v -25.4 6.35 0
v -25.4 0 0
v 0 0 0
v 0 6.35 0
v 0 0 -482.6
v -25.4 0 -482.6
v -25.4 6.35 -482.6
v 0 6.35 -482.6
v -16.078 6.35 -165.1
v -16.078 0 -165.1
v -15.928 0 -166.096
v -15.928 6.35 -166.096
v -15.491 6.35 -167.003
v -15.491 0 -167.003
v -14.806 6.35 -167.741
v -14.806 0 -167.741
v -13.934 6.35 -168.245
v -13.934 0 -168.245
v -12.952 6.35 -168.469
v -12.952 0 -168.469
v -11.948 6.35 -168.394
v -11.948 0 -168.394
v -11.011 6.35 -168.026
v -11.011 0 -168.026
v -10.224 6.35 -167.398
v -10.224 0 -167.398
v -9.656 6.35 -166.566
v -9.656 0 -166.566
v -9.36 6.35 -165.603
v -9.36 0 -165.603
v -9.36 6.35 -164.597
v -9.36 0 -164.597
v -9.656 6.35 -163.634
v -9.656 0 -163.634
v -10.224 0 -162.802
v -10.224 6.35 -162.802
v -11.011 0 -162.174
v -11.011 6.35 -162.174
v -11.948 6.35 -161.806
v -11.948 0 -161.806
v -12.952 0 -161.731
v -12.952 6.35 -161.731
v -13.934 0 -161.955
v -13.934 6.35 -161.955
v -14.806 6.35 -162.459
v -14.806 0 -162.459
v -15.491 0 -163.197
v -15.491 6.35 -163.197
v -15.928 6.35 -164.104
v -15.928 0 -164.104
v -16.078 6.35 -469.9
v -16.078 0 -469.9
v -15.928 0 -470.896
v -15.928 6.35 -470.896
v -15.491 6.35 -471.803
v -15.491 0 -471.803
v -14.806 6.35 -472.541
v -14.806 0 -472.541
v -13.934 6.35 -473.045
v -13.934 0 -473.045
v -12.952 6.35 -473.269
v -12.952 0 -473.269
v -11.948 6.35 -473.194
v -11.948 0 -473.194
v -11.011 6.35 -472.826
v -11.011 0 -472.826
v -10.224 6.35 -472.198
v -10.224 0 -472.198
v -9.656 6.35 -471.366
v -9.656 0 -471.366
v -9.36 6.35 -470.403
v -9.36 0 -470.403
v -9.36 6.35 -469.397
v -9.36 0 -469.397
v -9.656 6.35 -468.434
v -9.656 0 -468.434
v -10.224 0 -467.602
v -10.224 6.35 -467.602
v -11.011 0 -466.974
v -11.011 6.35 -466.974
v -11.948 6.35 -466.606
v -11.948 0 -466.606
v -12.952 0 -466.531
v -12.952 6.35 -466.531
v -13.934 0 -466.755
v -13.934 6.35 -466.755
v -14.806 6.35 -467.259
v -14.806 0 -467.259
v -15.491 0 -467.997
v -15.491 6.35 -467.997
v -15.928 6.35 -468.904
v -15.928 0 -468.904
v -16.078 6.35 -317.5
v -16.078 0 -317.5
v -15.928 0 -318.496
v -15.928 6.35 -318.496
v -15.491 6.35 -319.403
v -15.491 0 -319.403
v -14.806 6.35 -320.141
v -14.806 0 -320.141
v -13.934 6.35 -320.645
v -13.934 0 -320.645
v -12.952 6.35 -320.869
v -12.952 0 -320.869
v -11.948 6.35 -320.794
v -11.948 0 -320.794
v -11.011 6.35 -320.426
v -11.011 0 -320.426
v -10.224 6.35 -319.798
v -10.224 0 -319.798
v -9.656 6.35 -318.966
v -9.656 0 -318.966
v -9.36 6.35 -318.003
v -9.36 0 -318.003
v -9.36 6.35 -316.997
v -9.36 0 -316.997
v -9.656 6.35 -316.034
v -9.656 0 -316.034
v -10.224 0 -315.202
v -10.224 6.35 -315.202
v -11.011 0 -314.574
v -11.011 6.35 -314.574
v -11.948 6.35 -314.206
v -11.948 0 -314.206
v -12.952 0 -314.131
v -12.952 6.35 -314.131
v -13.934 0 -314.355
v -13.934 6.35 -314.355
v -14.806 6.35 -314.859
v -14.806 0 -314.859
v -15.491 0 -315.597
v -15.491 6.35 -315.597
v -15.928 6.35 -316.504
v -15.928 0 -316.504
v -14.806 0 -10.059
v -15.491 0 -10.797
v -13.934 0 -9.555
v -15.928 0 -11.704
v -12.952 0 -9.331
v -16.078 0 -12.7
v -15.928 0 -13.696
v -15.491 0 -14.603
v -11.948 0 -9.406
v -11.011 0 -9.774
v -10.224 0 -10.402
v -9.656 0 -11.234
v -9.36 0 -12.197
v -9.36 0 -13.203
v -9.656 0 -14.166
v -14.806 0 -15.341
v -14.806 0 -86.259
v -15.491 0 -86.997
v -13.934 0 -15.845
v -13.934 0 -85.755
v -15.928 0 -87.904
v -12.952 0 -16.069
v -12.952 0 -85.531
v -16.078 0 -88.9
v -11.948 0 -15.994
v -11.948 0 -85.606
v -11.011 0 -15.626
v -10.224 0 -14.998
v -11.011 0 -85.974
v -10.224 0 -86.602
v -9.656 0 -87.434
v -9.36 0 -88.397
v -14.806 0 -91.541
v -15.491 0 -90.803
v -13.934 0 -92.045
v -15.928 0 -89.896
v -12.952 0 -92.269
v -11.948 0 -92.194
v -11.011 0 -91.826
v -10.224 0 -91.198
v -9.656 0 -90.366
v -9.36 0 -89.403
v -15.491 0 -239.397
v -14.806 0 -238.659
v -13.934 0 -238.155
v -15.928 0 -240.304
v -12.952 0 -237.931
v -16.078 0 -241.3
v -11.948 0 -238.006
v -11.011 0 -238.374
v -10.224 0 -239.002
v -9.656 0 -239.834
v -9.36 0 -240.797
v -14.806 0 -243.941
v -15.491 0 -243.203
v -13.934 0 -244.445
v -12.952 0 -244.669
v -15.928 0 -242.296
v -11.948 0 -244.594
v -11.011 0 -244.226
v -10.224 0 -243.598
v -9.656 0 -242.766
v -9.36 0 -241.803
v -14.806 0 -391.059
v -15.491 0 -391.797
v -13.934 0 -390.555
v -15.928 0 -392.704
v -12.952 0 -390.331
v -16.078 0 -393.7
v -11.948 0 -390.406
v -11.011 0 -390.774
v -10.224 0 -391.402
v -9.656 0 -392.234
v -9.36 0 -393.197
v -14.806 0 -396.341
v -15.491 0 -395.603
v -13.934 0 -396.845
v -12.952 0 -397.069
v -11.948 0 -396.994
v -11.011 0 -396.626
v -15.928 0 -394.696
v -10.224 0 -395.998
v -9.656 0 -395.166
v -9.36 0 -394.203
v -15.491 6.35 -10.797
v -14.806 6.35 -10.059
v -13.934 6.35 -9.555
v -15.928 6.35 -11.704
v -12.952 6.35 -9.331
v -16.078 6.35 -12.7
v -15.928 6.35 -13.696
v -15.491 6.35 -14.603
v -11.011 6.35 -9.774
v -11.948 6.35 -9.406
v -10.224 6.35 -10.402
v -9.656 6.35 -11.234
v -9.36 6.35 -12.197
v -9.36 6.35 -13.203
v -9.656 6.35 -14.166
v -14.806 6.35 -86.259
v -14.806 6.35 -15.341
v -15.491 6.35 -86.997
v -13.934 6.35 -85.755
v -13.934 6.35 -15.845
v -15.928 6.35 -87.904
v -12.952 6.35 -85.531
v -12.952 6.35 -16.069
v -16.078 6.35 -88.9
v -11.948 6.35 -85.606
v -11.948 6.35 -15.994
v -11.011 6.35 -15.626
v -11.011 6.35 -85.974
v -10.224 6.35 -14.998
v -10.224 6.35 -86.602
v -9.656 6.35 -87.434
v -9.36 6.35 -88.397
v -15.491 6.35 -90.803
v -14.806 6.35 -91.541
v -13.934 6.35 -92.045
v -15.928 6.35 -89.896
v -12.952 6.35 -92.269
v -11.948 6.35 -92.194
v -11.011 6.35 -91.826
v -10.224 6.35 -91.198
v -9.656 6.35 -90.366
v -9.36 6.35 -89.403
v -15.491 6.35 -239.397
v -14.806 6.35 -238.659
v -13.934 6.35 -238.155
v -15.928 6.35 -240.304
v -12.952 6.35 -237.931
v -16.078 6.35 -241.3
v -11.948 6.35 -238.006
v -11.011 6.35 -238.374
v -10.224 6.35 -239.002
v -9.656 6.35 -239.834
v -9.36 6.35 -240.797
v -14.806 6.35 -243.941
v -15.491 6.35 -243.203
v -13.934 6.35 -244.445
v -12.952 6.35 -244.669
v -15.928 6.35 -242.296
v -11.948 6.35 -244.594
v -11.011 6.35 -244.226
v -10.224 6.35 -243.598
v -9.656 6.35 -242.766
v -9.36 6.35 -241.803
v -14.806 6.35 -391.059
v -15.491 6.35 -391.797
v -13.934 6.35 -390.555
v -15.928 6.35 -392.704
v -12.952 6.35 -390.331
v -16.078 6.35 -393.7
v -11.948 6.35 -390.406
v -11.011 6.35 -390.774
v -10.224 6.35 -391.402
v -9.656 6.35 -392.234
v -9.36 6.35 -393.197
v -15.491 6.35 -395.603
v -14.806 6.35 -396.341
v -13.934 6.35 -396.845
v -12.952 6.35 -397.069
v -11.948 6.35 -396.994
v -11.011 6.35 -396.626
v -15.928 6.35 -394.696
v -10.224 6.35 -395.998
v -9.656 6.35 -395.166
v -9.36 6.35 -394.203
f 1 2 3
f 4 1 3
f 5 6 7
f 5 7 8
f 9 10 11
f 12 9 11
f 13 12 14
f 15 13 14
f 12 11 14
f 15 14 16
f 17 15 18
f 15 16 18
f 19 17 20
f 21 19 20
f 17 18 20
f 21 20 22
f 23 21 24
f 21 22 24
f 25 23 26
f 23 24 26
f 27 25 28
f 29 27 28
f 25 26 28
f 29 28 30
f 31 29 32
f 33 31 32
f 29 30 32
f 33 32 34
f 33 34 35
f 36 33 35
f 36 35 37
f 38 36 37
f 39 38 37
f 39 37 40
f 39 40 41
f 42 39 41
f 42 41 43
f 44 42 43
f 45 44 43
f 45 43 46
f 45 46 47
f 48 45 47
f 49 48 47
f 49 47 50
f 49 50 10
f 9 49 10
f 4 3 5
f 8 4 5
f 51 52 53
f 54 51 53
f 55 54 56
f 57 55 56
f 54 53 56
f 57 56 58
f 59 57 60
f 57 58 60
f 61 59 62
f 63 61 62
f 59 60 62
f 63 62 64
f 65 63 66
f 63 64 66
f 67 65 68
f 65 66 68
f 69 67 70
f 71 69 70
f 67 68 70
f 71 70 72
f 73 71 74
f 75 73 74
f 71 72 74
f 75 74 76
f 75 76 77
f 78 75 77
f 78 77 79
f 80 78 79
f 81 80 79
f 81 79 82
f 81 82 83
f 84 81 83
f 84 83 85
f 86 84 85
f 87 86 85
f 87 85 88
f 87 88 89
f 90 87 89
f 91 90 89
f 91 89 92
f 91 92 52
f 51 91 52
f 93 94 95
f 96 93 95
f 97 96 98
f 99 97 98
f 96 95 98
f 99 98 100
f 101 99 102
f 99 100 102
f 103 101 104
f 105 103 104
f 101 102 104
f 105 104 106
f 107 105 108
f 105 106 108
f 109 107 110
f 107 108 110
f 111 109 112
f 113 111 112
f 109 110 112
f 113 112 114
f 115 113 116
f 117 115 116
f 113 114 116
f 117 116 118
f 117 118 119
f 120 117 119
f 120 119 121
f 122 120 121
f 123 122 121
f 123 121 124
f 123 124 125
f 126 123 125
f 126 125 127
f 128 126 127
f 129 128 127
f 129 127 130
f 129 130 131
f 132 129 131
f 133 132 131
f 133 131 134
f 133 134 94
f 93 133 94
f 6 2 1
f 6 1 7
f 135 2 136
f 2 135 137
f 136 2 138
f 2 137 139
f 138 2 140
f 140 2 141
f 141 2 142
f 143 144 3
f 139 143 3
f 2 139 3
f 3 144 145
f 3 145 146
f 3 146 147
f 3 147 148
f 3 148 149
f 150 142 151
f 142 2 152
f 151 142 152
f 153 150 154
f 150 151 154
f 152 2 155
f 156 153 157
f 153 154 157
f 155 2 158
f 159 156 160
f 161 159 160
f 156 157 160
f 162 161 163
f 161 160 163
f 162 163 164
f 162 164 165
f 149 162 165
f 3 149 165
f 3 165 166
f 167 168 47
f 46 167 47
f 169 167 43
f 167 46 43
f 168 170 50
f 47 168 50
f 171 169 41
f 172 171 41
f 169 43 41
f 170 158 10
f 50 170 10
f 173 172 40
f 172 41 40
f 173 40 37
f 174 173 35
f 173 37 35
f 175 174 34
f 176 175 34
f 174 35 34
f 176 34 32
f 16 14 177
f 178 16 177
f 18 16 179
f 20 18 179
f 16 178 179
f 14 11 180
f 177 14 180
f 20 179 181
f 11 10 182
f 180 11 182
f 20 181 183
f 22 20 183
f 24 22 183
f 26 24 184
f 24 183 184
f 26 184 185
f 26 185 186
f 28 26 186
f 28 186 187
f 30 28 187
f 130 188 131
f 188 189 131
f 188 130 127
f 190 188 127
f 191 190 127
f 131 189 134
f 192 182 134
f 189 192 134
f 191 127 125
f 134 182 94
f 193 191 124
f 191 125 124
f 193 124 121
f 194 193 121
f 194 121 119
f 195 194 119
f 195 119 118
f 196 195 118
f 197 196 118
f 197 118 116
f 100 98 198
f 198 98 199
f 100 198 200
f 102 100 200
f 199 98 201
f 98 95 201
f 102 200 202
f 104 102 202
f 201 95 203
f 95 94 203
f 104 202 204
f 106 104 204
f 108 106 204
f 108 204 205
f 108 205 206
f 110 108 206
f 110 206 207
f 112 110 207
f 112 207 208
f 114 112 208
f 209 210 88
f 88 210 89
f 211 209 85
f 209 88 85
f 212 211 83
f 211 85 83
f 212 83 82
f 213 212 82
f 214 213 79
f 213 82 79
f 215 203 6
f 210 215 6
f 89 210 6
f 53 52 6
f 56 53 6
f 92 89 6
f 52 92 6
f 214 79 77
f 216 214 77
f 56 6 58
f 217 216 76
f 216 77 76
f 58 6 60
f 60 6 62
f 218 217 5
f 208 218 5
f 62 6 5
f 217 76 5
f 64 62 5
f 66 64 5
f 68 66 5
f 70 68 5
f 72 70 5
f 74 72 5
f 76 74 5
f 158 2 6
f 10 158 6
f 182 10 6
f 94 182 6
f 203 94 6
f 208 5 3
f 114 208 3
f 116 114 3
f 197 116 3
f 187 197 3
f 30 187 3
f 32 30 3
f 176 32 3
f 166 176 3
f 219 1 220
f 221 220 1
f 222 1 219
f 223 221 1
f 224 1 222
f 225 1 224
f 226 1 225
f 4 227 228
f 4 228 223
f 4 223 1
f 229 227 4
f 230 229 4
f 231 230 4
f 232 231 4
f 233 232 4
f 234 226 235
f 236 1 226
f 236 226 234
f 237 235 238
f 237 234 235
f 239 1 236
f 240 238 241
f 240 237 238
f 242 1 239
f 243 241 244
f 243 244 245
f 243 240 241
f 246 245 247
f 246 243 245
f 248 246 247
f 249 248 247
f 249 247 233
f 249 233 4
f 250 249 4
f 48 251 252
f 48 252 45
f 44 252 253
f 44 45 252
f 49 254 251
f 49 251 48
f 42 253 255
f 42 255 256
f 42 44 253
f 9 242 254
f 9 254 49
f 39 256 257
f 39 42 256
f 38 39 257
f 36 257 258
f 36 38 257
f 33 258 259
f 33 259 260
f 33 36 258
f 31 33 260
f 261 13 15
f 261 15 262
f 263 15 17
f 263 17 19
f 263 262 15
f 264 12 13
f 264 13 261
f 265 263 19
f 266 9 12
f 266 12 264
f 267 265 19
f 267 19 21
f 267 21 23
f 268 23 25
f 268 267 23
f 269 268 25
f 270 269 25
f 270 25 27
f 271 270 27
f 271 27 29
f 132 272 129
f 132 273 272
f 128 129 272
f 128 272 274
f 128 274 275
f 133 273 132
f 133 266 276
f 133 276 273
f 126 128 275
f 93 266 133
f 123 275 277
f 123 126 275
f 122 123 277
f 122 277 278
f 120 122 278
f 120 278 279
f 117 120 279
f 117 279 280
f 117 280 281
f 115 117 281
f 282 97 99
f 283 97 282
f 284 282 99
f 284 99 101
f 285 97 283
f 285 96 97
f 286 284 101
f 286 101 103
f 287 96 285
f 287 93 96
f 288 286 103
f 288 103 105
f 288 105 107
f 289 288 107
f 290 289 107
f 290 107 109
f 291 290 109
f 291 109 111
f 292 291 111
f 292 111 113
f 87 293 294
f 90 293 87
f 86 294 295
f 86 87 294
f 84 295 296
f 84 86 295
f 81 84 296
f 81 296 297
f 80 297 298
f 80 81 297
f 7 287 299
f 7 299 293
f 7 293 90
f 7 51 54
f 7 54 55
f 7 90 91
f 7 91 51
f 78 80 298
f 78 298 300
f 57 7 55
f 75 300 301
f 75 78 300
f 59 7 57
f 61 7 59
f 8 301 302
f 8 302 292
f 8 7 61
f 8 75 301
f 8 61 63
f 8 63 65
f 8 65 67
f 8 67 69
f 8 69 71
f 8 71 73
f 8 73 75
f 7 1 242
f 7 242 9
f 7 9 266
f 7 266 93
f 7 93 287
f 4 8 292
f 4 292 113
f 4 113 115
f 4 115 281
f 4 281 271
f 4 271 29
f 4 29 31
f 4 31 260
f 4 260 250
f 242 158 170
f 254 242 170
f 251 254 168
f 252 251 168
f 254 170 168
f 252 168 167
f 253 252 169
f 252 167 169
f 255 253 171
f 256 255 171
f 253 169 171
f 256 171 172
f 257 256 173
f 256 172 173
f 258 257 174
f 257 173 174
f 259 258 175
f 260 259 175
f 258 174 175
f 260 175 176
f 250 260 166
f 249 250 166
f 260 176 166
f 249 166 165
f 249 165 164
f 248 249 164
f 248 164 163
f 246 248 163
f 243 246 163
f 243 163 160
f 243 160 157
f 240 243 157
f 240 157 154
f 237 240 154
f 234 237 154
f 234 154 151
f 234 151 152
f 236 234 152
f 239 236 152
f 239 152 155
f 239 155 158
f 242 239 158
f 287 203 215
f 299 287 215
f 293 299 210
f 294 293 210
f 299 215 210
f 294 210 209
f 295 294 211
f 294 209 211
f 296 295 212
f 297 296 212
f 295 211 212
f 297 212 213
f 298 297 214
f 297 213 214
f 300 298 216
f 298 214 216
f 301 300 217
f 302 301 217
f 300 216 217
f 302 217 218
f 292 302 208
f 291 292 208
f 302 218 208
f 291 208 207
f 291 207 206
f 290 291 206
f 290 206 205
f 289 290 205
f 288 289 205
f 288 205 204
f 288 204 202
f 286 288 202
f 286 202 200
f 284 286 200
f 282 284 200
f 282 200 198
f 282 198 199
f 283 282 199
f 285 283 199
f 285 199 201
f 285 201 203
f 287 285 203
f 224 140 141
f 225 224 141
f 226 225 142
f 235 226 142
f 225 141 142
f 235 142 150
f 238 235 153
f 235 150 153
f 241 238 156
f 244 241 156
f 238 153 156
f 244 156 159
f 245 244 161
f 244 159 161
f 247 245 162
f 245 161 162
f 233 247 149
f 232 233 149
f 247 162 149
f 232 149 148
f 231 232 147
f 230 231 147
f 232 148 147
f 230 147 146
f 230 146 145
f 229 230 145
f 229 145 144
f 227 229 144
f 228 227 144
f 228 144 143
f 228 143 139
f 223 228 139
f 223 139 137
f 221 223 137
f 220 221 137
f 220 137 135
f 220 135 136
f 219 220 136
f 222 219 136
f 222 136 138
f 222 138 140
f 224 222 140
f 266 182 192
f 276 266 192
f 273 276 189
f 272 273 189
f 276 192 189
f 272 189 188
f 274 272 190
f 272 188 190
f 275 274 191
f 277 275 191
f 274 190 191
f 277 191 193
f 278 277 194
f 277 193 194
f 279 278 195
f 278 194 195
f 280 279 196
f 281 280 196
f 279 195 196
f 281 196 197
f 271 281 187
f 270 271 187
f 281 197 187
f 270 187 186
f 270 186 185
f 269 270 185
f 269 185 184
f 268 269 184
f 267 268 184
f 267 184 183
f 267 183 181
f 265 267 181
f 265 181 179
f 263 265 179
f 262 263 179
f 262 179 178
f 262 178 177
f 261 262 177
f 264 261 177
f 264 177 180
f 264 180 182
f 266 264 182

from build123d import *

# Parameters (mm, degrees)
SKETCH1_W               = 25.4
SKETCH1_H               = 482.6
BOSS_EXTRUDE1_DEPTH     = 6.35
F_1_4_CLEARANCE_HOLE1_D = 6.7564


with BuildPart() as part:
    # Sketch1 → Boss-Extrude1 (new body)
    with BuildSketch(Plane(origin=(0, 0, 0), x_dir=(1, 0, 0), z_dir=(0, 1, 0))):
        with Locations((-12.7, 241.3)):
            Rectangle(SKETCH1_W, SKETCH1_H)
    extrude(amount=BOSS_EXTRUDE1_DEPTH)

    # 1/4 Clearance Hole1 (through all)
    with Locations(Plane(origin=(0, 6.35, 0), x_dir=(1, 0, 0), z_dir=(0, 1, 0))):
        with Locations((-12.7, 12.7), (-12.7, 88.9), (-12.7, 165.1), (-12.7, 241.3), (-12.7, 317.5), (-12.7, 393.7), (-12.7, 469.9)):
            Hole(F_1_4_CLEARANCE_HOLE1_D / 2)


solid = part.part
